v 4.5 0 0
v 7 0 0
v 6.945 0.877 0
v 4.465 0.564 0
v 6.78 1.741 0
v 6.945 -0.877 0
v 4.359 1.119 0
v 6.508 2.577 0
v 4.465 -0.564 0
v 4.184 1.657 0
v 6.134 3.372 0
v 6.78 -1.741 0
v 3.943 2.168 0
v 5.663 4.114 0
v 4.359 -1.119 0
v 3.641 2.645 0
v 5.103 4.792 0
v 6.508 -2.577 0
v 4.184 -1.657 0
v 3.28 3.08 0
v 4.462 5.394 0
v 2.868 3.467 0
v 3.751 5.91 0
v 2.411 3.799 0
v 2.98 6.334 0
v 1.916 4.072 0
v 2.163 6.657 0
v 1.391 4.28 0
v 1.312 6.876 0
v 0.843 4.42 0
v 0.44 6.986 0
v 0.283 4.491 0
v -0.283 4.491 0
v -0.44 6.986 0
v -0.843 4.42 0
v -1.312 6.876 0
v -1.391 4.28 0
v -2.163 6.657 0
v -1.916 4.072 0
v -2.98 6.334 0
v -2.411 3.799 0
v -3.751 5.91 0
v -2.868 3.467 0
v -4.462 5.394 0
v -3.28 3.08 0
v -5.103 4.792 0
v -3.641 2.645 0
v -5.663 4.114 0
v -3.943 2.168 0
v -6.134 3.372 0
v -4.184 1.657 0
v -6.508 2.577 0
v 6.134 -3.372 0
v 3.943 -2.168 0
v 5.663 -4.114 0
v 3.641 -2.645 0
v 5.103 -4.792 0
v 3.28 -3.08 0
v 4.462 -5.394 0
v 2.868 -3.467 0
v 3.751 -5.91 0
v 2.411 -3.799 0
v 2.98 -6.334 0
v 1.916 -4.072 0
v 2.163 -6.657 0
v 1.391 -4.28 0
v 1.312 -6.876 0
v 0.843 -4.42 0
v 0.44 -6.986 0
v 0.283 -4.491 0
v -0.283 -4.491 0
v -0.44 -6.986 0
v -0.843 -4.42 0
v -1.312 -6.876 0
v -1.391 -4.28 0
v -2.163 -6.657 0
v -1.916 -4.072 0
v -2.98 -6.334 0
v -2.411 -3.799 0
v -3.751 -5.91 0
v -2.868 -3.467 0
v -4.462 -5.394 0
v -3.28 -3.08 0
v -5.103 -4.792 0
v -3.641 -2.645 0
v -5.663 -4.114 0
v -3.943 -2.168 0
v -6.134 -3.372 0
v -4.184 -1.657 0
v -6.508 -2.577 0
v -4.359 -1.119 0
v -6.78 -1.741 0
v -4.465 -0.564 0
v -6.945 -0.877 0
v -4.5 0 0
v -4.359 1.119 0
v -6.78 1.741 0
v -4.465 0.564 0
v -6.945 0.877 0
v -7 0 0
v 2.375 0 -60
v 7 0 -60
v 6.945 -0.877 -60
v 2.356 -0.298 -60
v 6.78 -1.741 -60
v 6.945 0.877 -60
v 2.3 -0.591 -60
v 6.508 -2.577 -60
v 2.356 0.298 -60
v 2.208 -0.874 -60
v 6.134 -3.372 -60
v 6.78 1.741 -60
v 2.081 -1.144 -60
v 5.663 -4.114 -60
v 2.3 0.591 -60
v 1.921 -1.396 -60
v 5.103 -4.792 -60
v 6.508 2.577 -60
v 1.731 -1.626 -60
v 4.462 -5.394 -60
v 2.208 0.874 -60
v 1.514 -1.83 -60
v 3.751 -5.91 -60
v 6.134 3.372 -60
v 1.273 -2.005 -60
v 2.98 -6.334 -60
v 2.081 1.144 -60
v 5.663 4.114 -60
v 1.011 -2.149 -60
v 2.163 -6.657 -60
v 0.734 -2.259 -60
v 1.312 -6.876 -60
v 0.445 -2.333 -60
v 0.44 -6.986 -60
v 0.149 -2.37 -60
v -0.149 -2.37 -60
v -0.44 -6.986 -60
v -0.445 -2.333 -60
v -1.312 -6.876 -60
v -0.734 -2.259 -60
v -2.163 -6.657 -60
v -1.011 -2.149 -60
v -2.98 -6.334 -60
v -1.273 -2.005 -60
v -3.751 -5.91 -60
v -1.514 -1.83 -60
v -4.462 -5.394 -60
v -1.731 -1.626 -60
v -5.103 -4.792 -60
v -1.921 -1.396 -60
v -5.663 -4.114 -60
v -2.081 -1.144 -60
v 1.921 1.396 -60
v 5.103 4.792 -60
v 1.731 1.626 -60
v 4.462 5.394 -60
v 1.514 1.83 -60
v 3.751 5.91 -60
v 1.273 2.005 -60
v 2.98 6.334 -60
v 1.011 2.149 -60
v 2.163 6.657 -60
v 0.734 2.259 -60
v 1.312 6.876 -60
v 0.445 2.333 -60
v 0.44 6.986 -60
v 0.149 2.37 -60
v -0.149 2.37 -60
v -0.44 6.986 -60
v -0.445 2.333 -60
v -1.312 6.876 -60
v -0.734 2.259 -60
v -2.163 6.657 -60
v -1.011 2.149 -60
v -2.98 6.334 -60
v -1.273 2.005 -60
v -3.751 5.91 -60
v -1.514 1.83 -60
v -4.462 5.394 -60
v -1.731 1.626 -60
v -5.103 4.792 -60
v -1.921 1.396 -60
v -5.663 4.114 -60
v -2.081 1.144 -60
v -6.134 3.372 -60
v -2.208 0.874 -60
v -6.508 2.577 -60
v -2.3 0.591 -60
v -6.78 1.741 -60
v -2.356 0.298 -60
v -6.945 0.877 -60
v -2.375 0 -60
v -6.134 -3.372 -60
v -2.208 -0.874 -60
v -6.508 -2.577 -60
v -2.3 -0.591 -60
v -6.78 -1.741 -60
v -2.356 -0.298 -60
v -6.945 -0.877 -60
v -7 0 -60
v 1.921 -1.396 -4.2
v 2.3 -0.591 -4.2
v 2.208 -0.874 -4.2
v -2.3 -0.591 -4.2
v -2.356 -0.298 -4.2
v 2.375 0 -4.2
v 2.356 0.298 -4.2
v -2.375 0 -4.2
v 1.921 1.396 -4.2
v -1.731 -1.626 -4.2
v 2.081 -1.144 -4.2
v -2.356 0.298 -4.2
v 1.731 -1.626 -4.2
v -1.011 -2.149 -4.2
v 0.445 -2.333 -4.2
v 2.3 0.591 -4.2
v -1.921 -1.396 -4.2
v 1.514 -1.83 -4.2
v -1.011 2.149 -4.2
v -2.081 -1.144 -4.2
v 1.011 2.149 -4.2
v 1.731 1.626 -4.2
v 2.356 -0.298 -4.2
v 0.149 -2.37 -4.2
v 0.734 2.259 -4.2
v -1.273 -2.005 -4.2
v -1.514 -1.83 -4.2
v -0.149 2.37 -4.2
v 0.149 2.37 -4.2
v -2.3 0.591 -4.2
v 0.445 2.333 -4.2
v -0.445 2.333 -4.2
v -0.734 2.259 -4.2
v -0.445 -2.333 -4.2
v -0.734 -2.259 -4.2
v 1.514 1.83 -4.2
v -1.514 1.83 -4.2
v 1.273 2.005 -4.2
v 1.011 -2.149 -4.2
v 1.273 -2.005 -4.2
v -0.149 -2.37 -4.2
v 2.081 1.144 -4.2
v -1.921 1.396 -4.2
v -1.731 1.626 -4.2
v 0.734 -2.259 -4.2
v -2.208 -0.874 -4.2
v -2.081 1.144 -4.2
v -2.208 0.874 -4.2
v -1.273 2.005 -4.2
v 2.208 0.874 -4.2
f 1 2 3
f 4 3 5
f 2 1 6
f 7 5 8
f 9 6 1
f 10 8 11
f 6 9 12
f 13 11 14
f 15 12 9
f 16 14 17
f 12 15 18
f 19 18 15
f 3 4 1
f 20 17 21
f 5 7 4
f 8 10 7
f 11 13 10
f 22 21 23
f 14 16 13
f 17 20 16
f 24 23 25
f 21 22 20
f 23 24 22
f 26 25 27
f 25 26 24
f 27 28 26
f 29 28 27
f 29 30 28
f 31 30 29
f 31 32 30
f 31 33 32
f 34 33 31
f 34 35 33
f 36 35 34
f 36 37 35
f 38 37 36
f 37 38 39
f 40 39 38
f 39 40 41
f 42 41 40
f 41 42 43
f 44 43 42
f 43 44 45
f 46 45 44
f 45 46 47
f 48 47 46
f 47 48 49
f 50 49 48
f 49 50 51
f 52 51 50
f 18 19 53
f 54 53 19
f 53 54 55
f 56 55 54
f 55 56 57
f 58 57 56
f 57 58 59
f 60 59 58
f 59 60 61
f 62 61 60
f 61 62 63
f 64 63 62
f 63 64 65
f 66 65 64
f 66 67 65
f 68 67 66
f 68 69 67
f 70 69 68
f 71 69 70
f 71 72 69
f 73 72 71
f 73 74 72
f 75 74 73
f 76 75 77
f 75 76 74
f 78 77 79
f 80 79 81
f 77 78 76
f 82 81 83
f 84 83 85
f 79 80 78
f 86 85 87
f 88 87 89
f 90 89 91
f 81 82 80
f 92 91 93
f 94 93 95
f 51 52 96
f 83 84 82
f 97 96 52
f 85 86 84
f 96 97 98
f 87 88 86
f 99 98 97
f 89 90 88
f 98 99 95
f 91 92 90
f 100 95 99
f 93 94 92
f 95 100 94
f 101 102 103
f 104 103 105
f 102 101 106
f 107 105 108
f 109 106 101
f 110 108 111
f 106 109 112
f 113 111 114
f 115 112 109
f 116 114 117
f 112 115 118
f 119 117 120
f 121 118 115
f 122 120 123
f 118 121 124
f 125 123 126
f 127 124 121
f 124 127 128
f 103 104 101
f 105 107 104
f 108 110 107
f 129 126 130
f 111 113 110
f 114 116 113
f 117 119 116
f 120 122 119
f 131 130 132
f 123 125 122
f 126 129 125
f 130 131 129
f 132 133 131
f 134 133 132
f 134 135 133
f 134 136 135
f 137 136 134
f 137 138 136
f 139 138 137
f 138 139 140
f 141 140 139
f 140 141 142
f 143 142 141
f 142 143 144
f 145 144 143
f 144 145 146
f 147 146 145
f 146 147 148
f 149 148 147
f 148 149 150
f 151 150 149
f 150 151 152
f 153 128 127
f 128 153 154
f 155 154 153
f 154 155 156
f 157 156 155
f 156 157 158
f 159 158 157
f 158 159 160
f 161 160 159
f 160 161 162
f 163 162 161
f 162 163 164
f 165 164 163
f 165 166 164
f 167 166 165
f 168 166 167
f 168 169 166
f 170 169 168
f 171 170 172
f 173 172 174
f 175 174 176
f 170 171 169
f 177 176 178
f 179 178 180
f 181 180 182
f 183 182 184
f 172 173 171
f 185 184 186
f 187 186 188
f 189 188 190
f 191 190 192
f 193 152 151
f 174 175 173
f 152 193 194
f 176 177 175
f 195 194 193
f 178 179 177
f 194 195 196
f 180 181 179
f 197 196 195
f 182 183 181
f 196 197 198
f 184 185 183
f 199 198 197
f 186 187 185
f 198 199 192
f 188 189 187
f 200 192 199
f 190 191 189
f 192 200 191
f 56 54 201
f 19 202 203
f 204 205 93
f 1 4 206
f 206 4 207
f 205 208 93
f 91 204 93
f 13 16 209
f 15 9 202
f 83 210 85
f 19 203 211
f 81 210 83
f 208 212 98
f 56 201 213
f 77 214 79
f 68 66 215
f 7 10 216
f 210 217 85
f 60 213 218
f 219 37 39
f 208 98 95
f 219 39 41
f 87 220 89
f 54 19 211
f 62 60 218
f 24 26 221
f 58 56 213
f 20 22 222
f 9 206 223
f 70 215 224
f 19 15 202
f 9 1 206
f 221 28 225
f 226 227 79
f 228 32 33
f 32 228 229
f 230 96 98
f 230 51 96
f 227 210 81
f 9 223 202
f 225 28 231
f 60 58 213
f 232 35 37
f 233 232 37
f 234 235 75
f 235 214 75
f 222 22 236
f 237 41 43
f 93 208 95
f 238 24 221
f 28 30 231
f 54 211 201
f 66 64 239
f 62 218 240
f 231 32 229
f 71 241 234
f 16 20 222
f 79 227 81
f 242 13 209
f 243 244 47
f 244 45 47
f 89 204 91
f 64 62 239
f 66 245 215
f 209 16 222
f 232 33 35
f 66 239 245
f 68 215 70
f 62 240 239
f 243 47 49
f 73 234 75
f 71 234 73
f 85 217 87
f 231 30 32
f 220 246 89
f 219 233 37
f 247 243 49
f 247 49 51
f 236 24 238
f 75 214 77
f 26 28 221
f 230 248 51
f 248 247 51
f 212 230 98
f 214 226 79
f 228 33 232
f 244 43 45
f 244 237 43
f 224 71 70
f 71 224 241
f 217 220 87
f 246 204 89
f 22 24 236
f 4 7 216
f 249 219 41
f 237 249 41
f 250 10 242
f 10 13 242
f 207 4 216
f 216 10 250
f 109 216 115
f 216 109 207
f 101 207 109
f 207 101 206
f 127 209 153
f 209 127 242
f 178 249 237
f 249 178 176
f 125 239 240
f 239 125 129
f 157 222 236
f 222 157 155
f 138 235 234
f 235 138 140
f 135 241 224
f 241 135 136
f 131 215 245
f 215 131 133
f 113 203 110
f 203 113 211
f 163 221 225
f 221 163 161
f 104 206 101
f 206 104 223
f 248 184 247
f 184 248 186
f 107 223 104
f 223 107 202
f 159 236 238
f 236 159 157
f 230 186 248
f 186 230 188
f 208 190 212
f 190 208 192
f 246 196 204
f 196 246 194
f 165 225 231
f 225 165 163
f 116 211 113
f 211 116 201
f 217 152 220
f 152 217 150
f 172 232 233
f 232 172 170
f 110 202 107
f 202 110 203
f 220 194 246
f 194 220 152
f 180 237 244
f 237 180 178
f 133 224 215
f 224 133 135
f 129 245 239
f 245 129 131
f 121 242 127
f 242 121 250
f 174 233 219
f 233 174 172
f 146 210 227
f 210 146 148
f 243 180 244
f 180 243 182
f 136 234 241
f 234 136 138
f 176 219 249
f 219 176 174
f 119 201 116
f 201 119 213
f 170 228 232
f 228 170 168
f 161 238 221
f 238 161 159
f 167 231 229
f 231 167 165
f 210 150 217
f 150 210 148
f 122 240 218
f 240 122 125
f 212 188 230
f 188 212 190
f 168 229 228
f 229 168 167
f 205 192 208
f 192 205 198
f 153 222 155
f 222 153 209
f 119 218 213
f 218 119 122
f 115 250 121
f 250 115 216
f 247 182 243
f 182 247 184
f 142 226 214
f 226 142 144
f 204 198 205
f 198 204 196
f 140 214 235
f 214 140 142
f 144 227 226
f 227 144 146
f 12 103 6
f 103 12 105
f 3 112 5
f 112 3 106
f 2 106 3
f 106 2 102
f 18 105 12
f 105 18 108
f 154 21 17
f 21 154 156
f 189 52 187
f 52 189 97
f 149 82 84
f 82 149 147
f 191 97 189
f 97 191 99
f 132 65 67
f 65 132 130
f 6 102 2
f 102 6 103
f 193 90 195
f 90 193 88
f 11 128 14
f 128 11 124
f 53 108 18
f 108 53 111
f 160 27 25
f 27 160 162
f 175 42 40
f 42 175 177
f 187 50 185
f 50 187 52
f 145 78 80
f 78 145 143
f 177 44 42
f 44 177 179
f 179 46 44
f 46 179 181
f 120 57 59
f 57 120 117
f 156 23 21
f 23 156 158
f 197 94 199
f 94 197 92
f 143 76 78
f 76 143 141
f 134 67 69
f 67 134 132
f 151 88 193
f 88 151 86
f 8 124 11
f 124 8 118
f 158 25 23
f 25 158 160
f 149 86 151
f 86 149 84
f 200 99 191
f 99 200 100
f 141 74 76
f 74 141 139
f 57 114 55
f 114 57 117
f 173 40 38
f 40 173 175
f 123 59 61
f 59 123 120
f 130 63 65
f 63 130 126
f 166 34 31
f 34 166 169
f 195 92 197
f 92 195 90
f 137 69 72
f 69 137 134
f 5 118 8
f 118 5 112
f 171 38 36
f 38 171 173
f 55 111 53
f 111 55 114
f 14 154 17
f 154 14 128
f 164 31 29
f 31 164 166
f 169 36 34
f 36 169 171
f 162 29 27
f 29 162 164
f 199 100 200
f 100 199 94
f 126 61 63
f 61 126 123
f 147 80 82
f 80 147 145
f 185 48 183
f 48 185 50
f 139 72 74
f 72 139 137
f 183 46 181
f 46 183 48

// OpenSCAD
$fn = 50;


difference() {
	union() {
		translate(v = [0, 0, -60.0000000000]) {
			cylinder(h = 60, r = 7.0000000000);
		}
		cylinder(h = 0, r = 13.0000000000);
	}
	union() {
		translate(v = [0, 0, 0]) {
			rotate(a = [0, 0, 0]) {
				difference() {
					union() {
						#translate(v = [0, 0, -60.0000000000]) {
							cylinder(h = 60, r = 2.2500000000);
						}
						#translate(v = [0, 0, -4.2000000000]) {
							cylinder(h = 4.2000000000, r = 7.0000000000, r1 = 2.3750000000, r2 = 4.5000000000);
						}
						#translate(v = [0, 0, -60.0000000000]) {
							cylinder(h = 60, r = 2.3750000000);
						}
						#translate(v = [0, 0, -60.0000000000]) {
							cylinder(h = 60, r = 2.2500000000);
						}
					}
					union();
				}
			}
		}
	}
}
